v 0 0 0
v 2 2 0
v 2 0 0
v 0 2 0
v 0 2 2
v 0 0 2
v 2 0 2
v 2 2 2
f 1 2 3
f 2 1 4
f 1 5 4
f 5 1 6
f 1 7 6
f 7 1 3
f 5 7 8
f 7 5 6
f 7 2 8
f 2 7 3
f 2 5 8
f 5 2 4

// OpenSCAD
minkowski() {
  cube();
  linear_extrude() {
    import("notfound.dxf");
  }
  linear_extrude() {
    import("notfound.dxf");
  }
}

minkowski() {
  linear_extrude() {
    import("notfound.dxf");
  }
  linear_extrude() {
    import("notfound.dxf");
  }
  cube();
  cube();
}
